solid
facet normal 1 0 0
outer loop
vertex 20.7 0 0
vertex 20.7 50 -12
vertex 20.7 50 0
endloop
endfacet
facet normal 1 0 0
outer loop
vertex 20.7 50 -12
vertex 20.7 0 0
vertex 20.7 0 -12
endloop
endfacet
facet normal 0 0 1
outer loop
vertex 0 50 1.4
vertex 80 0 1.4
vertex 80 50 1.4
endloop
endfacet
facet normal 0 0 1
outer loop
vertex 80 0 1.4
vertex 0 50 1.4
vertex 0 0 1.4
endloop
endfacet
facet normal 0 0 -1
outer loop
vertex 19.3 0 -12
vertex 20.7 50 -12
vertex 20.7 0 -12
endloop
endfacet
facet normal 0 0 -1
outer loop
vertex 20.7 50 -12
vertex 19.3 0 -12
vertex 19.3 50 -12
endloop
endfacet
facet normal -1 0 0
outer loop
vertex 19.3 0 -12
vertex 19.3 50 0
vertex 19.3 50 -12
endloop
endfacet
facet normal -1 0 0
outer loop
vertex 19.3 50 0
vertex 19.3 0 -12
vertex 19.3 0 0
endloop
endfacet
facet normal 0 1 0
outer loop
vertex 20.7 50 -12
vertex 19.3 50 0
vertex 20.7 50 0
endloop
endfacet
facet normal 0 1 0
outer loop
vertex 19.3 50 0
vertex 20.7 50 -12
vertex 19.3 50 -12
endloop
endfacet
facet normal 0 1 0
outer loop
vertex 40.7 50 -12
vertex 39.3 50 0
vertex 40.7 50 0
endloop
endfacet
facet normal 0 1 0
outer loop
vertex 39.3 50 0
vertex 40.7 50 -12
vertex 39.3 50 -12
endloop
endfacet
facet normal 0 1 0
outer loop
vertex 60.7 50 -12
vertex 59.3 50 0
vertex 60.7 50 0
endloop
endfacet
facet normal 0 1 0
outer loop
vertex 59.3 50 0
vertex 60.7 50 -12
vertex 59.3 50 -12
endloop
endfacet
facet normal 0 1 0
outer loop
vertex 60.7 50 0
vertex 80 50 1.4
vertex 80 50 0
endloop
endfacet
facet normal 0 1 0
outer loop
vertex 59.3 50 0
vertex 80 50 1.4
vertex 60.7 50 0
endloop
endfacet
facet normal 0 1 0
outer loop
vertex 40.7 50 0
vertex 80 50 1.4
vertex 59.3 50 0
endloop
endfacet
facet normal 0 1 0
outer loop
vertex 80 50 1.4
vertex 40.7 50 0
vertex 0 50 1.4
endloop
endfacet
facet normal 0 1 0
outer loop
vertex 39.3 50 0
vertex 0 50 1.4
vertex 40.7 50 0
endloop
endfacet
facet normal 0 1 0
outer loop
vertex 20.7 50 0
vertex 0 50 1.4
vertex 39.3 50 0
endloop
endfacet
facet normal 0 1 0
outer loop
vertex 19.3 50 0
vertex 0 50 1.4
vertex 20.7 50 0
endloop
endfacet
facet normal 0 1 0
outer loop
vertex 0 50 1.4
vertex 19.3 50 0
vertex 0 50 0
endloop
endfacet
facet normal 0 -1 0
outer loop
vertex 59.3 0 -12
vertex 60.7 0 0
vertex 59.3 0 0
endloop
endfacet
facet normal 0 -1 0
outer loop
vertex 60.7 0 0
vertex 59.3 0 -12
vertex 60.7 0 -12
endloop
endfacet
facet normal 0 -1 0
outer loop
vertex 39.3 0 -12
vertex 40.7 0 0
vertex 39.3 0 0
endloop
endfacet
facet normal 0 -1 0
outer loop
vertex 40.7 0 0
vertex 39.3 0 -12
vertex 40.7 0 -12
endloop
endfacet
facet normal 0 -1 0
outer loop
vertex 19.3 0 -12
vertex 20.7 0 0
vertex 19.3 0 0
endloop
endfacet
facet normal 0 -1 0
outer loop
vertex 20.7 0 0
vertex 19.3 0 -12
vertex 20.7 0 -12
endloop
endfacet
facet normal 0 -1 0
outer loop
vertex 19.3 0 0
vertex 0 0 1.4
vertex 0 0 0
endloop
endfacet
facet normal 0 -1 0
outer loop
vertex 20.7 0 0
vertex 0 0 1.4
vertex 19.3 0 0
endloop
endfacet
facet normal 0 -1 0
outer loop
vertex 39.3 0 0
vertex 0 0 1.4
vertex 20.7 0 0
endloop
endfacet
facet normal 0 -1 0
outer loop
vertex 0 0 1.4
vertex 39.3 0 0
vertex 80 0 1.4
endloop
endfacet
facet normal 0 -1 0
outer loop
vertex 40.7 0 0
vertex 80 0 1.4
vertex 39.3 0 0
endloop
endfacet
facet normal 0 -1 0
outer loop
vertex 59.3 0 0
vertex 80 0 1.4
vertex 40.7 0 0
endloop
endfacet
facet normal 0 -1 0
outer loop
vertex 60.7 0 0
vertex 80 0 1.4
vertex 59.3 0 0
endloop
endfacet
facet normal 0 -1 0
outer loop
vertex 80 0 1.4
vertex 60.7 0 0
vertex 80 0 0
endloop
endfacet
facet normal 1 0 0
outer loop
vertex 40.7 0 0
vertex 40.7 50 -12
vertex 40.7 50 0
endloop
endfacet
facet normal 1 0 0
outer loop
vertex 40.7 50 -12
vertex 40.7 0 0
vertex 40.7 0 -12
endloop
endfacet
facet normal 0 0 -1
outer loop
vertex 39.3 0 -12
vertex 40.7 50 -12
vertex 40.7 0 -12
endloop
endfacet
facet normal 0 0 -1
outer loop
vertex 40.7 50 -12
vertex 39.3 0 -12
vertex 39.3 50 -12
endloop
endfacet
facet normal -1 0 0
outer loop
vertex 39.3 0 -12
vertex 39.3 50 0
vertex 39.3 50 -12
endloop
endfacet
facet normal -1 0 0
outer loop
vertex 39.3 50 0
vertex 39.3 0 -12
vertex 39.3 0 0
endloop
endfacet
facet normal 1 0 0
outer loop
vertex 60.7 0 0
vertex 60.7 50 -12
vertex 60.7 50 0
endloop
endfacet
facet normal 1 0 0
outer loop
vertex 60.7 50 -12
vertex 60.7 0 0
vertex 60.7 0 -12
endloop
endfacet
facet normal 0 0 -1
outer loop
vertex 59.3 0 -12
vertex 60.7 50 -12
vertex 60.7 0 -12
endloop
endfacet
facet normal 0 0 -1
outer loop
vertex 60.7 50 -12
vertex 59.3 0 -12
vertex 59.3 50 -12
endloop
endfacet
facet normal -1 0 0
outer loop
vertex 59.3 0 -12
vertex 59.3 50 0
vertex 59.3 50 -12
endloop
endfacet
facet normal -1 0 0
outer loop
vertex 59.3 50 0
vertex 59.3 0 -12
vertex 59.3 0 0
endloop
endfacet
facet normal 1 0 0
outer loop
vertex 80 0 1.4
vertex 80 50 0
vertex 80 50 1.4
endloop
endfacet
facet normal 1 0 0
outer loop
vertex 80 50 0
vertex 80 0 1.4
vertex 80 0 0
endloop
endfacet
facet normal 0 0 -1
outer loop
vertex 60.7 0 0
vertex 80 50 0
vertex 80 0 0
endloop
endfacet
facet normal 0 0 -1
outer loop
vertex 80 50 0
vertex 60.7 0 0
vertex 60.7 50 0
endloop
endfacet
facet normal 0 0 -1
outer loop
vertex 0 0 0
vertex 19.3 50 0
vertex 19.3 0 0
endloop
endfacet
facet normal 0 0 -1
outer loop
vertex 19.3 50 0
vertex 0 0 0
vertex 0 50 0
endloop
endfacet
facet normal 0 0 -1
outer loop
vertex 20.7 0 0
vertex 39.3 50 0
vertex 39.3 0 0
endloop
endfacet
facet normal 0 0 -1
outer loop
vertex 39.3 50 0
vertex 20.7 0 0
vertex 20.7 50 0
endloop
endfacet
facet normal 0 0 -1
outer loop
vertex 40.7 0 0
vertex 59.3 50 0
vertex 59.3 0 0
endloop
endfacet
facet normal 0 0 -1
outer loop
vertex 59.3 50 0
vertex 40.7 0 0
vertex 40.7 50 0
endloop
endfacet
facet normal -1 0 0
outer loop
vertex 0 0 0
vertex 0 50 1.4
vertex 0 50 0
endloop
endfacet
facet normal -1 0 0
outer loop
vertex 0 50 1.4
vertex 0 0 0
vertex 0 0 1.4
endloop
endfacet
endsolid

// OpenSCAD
$fn = 32;

// ----------------------------------------------------------------------
// Ribbed panel: 1.4 mm panel
// ----------------------------------------------------------------------

// --- parameters (mm) ---
panel_l = 80;             // panel length, X
panel_w = 50;             // panel width, Y
panel_t = 1.4;            // panel thickness, Z
rib_t = 1.4;              // rib thickness
rib_h = 12;               // rib height below the panel
ribs = 3;                 // number of ribs

total_h = panel_t + rib_h;  // overall height

union() {
  cube([panel_l, panel_w, panel_t]);
  for (i = [1 : ribs])
    translate([i * panel_l / (ribs + 1) - rib_t / 2, 0, -rib_h])
      cube([rib_t, panel_w, rib_h + panel_t]);
}
